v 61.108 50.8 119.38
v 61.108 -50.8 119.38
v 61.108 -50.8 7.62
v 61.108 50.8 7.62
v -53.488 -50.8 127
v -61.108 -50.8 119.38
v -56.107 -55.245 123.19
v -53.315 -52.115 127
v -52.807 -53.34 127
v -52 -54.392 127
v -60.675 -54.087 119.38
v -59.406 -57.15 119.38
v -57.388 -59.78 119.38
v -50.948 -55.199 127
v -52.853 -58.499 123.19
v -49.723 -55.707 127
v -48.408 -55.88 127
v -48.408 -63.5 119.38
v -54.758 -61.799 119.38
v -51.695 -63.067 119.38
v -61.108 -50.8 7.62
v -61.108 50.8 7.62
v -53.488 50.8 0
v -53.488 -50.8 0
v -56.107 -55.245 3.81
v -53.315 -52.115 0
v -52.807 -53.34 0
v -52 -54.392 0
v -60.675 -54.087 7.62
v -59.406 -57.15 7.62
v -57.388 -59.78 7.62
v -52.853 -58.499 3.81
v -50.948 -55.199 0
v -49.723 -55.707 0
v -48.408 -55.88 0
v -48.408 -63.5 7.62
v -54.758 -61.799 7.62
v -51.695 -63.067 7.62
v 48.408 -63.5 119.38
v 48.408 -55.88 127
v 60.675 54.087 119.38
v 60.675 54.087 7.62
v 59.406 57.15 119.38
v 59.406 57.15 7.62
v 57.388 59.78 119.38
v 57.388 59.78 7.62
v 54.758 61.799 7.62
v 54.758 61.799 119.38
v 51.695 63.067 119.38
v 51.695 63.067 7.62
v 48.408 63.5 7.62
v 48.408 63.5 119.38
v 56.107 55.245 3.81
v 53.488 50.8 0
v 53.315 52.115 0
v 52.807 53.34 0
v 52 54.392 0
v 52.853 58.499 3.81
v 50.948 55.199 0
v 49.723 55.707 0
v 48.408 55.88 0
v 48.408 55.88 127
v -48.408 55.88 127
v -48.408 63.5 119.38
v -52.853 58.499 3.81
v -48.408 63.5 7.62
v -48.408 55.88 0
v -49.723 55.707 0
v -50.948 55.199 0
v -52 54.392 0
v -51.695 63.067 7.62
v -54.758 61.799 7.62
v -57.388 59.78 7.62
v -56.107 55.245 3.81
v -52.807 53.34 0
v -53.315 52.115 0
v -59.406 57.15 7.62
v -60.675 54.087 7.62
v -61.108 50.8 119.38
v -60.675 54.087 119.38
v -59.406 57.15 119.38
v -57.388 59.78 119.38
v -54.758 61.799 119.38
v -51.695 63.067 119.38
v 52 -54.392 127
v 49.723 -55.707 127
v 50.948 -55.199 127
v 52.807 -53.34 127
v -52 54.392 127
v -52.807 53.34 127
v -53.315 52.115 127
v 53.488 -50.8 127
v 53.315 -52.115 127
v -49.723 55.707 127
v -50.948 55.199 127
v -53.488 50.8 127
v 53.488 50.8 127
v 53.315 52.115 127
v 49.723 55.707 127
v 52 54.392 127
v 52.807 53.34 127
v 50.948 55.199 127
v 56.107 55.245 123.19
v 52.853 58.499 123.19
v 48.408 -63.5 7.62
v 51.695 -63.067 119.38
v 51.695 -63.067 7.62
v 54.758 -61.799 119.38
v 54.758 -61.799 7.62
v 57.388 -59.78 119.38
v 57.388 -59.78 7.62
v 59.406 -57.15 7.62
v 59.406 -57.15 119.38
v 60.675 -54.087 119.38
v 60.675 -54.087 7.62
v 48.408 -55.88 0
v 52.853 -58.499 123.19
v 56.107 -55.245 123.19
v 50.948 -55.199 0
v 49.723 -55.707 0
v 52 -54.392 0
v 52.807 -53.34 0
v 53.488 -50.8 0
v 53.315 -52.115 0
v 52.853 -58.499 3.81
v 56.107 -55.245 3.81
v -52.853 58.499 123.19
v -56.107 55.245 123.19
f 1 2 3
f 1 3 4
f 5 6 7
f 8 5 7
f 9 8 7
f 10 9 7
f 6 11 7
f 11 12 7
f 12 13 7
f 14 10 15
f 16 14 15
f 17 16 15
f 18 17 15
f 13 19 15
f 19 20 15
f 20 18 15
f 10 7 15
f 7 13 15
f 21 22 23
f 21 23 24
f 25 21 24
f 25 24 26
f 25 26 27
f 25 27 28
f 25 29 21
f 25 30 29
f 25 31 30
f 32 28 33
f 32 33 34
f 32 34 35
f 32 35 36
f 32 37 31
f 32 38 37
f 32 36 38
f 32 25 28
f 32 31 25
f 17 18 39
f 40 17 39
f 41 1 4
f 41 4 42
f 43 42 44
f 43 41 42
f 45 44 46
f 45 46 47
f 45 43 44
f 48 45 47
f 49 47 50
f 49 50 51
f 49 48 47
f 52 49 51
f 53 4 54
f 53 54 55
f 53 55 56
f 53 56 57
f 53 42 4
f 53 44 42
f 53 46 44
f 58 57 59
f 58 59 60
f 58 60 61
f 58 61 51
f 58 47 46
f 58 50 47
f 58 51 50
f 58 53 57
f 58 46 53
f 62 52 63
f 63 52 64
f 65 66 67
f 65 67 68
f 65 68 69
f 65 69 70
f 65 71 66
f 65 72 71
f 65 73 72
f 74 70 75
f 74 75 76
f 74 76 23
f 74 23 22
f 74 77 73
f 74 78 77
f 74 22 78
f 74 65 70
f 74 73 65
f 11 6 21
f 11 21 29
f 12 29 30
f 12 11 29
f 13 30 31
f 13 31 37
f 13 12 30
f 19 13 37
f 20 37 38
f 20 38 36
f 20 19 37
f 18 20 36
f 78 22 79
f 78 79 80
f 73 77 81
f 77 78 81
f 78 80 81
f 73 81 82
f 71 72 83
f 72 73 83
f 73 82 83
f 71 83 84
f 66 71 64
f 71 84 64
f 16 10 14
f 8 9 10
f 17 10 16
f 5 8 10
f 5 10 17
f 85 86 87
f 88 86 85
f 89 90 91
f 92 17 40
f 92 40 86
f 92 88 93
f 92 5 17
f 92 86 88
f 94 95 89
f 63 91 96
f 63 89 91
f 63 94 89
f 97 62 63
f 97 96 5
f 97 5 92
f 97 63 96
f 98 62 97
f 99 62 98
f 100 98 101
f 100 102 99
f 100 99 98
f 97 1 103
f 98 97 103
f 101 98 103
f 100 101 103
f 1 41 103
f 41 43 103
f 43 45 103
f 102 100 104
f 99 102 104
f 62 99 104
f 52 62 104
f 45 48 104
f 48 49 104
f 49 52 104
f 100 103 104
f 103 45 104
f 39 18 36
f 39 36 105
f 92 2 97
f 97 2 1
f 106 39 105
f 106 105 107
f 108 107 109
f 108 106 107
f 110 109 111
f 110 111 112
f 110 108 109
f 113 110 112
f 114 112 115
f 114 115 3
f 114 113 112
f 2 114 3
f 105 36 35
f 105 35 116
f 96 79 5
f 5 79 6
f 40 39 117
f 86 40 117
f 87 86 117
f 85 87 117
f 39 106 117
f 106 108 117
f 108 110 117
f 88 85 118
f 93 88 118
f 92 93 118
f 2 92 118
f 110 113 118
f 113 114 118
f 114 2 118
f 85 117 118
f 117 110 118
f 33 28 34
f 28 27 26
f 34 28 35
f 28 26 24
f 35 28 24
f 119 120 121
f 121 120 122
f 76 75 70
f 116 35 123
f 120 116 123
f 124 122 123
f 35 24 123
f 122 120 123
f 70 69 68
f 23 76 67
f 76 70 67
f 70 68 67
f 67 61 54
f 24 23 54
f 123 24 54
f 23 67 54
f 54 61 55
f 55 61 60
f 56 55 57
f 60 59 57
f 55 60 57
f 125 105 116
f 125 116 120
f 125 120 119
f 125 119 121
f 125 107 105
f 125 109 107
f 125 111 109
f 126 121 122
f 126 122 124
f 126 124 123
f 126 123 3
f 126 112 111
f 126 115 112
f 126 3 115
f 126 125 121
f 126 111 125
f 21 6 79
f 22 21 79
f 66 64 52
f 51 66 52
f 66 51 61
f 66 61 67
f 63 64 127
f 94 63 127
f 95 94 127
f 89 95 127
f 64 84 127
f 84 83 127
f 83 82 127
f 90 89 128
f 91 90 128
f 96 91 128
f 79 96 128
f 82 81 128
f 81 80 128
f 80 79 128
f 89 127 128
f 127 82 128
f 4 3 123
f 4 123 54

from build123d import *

# Parameters (mm, degrees)
F0_W     = 122.215742
F0_H     = 127
F1_DEPTH = 127
F2_R     = 12.7
F3_SIZE  = 7.62


with BuildPart() as f1:
    # F0 (on Top) → F1 (new body)
    with BuildSketch(Plane.XY):
        Rectangle(F0_W, F0_H)
    extrude(amount=F1_DEPTH)

    # F2
    f2_edges = [f1.edges().sort_by_distance(p)[0] for p in [
        (61.107871, 63.5, 63.5),
        (61.107871, -63.5, 63.5),
        (-61.107871, -63.5, 63.5),
        (-61.107871, 63.5, 63.5),
    ]]
    fillet(f2_edges, radius=F2_R)

    # F3
    f3_edges = [f1.edges().sort_by_distance(p)[0] for p in [
        (61.107871, 0, 127),
        (61.107871, 0, 0),
    ]]
    chamfer(f3_edges, length=F3_SIZE)


solid = f1.part
